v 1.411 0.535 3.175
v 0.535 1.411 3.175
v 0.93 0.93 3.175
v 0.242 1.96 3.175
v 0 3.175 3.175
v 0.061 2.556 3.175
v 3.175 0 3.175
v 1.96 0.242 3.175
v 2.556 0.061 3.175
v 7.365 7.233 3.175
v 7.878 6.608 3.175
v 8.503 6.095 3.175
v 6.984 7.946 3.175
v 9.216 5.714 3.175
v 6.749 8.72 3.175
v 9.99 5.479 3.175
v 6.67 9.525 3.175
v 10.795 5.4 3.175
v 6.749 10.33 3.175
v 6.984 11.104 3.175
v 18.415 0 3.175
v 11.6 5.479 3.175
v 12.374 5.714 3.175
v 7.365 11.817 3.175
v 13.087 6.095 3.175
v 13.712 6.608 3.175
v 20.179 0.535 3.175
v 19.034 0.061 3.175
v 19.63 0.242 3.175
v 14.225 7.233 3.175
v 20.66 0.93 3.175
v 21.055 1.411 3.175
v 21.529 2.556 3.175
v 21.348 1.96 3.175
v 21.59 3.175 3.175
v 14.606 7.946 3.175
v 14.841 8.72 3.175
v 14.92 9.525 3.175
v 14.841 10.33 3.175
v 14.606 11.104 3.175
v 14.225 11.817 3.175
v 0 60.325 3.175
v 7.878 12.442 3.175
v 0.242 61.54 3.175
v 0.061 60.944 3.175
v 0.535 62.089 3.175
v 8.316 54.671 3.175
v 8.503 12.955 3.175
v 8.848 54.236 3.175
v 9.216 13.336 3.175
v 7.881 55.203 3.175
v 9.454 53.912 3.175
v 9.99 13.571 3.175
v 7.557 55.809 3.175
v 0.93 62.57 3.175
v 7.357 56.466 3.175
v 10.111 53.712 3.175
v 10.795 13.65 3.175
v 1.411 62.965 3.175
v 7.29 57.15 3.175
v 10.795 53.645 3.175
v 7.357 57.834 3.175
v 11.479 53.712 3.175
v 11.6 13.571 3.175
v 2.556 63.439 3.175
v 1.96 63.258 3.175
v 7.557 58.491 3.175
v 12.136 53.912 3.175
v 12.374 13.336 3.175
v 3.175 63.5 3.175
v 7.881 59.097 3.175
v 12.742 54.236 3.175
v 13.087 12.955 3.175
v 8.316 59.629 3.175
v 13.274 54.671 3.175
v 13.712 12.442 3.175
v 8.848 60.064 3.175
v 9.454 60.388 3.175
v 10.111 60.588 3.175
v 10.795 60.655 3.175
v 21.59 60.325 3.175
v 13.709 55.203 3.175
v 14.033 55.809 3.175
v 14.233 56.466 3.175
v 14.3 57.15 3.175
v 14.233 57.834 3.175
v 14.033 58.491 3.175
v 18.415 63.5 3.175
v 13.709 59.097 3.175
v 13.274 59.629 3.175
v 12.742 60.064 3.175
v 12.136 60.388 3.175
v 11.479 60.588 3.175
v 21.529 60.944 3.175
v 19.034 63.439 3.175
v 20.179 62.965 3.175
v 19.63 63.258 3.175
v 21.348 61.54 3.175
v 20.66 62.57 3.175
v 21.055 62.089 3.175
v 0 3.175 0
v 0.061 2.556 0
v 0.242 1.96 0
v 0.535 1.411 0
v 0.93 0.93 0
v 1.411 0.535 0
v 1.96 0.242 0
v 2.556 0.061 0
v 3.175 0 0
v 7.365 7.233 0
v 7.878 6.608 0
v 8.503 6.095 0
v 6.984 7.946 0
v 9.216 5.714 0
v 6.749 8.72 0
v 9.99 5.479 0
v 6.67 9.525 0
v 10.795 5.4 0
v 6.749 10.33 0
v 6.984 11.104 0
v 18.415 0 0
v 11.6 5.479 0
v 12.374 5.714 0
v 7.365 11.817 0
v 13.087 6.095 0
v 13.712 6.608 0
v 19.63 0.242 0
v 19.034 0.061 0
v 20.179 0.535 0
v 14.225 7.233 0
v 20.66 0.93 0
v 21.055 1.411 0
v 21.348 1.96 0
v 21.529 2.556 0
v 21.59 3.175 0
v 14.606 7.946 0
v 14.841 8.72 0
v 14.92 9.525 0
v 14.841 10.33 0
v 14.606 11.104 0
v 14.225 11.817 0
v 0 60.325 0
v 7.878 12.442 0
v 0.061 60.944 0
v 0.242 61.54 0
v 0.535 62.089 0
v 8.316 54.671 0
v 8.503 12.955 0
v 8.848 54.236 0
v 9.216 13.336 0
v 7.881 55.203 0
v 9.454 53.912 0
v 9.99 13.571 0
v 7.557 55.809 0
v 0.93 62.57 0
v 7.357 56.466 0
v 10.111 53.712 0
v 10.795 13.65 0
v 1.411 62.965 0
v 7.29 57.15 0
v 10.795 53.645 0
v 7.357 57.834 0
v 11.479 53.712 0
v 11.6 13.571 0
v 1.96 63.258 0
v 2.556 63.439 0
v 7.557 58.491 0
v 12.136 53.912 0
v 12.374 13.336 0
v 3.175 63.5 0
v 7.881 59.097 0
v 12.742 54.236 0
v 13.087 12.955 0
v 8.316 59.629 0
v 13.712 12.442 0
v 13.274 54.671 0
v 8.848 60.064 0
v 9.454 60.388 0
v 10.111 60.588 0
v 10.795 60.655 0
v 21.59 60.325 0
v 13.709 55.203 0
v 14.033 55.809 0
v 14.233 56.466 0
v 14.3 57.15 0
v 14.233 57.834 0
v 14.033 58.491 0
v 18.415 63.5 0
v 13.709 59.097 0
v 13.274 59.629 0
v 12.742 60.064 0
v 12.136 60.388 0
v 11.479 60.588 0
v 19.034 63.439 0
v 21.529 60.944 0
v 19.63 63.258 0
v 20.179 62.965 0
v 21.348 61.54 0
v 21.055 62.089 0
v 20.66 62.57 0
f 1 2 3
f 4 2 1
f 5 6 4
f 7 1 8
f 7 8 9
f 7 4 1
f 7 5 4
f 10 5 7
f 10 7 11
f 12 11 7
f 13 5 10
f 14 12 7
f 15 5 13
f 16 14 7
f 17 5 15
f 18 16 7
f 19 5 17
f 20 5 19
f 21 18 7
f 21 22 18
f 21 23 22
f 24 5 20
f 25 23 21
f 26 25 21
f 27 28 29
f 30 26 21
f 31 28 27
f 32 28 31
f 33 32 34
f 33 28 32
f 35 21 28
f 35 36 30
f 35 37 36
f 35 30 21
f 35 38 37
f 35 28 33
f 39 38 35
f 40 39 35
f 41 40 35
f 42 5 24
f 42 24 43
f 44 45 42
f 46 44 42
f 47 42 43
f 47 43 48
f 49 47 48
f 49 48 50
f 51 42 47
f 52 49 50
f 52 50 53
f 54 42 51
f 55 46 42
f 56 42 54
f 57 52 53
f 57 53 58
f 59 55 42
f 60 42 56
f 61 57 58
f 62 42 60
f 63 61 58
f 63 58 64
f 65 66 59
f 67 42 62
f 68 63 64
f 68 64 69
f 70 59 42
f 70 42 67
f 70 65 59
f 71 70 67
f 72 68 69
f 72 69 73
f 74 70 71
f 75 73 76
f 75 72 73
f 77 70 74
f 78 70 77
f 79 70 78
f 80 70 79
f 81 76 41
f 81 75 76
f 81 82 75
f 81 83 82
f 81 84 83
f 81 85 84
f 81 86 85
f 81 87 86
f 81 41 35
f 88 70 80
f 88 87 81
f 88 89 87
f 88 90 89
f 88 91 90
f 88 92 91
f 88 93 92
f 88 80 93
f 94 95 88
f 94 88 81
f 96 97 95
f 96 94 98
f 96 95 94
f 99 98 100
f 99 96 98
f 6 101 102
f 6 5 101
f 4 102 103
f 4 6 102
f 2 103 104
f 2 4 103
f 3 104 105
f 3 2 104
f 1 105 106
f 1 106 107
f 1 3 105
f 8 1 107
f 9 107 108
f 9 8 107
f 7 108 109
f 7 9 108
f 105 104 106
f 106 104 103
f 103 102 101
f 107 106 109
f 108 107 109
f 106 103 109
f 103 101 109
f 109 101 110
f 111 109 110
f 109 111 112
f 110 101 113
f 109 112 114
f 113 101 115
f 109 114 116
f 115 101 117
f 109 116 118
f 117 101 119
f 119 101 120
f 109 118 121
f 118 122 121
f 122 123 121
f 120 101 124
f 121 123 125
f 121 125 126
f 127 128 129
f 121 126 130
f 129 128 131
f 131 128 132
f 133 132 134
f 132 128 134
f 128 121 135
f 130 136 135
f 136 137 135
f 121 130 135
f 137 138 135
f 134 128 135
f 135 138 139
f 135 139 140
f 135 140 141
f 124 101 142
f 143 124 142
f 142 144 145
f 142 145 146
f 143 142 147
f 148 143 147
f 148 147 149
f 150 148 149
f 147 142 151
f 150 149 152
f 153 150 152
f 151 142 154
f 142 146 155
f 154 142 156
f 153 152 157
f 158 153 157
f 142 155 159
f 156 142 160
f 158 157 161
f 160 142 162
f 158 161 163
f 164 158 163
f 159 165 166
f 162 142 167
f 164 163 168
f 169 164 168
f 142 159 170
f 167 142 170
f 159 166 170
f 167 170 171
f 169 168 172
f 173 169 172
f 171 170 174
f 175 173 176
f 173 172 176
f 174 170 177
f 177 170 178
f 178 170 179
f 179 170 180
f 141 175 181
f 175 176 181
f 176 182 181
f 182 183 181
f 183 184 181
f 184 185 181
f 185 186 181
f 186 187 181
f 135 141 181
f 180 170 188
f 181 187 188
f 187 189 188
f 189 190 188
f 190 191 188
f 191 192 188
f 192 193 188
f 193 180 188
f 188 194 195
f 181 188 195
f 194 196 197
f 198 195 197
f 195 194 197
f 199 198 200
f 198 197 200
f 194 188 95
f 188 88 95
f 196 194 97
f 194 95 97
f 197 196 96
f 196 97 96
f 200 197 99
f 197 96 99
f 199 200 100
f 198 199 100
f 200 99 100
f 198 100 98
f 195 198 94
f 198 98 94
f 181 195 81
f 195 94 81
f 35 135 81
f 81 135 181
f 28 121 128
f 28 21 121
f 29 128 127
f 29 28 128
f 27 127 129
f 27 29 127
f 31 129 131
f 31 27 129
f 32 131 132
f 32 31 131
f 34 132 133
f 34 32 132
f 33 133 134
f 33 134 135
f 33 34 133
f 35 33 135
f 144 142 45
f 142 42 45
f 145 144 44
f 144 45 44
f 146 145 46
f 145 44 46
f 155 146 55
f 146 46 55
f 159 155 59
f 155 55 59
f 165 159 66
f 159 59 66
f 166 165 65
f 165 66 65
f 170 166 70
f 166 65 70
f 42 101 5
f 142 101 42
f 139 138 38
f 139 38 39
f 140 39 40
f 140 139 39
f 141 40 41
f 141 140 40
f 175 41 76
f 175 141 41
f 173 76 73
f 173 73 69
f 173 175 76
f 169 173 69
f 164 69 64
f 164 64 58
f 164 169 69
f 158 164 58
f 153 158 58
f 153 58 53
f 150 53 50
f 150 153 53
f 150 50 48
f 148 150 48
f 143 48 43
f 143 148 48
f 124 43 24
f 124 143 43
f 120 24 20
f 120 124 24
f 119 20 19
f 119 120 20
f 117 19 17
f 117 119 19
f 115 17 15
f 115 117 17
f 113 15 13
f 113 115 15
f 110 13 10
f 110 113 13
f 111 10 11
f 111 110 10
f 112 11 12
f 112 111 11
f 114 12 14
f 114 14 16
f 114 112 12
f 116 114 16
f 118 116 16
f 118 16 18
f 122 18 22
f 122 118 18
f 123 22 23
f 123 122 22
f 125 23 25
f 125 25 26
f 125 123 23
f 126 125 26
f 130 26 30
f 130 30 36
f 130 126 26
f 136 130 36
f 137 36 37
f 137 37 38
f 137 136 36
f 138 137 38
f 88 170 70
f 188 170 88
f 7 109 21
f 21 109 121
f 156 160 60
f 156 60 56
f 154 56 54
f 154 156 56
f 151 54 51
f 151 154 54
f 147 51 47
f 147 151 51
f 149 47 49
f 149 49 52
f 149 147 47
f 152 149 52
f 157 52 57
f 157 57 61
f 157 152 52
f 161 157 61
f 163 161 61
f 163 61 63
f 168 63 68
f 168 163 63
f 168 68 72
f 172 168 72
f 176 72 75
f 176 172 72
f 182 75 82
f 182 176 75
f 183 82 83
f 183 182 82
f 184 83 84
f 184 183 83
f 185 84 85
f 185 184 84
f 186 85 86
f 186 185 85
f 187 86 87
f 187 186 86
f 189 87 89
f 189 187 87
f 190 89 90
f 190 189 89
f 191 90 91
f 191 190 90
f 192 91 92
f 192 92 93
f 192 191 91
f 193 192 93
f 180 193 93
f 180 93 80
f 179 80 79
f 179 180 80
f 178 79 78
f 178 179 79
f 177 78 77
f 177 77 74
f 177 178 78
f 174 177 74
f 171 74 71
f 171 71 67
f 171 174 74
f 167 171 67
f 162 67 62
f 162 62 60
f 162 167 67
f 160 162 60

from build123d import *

# Parameters (mm, degrees)
SKETCH1_W           = 21.59
SKETCH1_H           = 63.5
SKETCH1_R           = 4.124999878
SKETCH1_R_2         = 3.5052
BOSS_EXTRUDE1_DEPTH = 3.175
FILLET1_R           = 3.175


with BuildPart() as part:
    # Sketch1 → Boss-Extrude1 (new body)
    with BuildSketch(Plane.XY):
        with Locations((10.795, 31.75)):
            Rectangle(SKETCH1_W, SKETCH1_H)
        with Locations((10.795, 9.525)):
            Circle(SKETCH1_R, mode=Mode.SUBTRACT)
        with Locations(Location((10.795, 57.15, 0), (0, 0, 180))):
            Circle(SKETCH1_R_2, mode=Mode.SUBTRACT)
    extrude(amount=BOSS_EXTRUDE1_DEPTH)

    # Fillet1
    fillet1_edges = [part.edges().sort_by_distance(p)[0] for p in [
        (0, 0, 1.5875),
        (21.59, 0, 1.5875),
        (21.59, 63.5, 1.5875),
        (0, 63.5, 1.5875),
    ]]
    fillet(fillet1_edges, radius=FILLET1_R)


solid = part.part
